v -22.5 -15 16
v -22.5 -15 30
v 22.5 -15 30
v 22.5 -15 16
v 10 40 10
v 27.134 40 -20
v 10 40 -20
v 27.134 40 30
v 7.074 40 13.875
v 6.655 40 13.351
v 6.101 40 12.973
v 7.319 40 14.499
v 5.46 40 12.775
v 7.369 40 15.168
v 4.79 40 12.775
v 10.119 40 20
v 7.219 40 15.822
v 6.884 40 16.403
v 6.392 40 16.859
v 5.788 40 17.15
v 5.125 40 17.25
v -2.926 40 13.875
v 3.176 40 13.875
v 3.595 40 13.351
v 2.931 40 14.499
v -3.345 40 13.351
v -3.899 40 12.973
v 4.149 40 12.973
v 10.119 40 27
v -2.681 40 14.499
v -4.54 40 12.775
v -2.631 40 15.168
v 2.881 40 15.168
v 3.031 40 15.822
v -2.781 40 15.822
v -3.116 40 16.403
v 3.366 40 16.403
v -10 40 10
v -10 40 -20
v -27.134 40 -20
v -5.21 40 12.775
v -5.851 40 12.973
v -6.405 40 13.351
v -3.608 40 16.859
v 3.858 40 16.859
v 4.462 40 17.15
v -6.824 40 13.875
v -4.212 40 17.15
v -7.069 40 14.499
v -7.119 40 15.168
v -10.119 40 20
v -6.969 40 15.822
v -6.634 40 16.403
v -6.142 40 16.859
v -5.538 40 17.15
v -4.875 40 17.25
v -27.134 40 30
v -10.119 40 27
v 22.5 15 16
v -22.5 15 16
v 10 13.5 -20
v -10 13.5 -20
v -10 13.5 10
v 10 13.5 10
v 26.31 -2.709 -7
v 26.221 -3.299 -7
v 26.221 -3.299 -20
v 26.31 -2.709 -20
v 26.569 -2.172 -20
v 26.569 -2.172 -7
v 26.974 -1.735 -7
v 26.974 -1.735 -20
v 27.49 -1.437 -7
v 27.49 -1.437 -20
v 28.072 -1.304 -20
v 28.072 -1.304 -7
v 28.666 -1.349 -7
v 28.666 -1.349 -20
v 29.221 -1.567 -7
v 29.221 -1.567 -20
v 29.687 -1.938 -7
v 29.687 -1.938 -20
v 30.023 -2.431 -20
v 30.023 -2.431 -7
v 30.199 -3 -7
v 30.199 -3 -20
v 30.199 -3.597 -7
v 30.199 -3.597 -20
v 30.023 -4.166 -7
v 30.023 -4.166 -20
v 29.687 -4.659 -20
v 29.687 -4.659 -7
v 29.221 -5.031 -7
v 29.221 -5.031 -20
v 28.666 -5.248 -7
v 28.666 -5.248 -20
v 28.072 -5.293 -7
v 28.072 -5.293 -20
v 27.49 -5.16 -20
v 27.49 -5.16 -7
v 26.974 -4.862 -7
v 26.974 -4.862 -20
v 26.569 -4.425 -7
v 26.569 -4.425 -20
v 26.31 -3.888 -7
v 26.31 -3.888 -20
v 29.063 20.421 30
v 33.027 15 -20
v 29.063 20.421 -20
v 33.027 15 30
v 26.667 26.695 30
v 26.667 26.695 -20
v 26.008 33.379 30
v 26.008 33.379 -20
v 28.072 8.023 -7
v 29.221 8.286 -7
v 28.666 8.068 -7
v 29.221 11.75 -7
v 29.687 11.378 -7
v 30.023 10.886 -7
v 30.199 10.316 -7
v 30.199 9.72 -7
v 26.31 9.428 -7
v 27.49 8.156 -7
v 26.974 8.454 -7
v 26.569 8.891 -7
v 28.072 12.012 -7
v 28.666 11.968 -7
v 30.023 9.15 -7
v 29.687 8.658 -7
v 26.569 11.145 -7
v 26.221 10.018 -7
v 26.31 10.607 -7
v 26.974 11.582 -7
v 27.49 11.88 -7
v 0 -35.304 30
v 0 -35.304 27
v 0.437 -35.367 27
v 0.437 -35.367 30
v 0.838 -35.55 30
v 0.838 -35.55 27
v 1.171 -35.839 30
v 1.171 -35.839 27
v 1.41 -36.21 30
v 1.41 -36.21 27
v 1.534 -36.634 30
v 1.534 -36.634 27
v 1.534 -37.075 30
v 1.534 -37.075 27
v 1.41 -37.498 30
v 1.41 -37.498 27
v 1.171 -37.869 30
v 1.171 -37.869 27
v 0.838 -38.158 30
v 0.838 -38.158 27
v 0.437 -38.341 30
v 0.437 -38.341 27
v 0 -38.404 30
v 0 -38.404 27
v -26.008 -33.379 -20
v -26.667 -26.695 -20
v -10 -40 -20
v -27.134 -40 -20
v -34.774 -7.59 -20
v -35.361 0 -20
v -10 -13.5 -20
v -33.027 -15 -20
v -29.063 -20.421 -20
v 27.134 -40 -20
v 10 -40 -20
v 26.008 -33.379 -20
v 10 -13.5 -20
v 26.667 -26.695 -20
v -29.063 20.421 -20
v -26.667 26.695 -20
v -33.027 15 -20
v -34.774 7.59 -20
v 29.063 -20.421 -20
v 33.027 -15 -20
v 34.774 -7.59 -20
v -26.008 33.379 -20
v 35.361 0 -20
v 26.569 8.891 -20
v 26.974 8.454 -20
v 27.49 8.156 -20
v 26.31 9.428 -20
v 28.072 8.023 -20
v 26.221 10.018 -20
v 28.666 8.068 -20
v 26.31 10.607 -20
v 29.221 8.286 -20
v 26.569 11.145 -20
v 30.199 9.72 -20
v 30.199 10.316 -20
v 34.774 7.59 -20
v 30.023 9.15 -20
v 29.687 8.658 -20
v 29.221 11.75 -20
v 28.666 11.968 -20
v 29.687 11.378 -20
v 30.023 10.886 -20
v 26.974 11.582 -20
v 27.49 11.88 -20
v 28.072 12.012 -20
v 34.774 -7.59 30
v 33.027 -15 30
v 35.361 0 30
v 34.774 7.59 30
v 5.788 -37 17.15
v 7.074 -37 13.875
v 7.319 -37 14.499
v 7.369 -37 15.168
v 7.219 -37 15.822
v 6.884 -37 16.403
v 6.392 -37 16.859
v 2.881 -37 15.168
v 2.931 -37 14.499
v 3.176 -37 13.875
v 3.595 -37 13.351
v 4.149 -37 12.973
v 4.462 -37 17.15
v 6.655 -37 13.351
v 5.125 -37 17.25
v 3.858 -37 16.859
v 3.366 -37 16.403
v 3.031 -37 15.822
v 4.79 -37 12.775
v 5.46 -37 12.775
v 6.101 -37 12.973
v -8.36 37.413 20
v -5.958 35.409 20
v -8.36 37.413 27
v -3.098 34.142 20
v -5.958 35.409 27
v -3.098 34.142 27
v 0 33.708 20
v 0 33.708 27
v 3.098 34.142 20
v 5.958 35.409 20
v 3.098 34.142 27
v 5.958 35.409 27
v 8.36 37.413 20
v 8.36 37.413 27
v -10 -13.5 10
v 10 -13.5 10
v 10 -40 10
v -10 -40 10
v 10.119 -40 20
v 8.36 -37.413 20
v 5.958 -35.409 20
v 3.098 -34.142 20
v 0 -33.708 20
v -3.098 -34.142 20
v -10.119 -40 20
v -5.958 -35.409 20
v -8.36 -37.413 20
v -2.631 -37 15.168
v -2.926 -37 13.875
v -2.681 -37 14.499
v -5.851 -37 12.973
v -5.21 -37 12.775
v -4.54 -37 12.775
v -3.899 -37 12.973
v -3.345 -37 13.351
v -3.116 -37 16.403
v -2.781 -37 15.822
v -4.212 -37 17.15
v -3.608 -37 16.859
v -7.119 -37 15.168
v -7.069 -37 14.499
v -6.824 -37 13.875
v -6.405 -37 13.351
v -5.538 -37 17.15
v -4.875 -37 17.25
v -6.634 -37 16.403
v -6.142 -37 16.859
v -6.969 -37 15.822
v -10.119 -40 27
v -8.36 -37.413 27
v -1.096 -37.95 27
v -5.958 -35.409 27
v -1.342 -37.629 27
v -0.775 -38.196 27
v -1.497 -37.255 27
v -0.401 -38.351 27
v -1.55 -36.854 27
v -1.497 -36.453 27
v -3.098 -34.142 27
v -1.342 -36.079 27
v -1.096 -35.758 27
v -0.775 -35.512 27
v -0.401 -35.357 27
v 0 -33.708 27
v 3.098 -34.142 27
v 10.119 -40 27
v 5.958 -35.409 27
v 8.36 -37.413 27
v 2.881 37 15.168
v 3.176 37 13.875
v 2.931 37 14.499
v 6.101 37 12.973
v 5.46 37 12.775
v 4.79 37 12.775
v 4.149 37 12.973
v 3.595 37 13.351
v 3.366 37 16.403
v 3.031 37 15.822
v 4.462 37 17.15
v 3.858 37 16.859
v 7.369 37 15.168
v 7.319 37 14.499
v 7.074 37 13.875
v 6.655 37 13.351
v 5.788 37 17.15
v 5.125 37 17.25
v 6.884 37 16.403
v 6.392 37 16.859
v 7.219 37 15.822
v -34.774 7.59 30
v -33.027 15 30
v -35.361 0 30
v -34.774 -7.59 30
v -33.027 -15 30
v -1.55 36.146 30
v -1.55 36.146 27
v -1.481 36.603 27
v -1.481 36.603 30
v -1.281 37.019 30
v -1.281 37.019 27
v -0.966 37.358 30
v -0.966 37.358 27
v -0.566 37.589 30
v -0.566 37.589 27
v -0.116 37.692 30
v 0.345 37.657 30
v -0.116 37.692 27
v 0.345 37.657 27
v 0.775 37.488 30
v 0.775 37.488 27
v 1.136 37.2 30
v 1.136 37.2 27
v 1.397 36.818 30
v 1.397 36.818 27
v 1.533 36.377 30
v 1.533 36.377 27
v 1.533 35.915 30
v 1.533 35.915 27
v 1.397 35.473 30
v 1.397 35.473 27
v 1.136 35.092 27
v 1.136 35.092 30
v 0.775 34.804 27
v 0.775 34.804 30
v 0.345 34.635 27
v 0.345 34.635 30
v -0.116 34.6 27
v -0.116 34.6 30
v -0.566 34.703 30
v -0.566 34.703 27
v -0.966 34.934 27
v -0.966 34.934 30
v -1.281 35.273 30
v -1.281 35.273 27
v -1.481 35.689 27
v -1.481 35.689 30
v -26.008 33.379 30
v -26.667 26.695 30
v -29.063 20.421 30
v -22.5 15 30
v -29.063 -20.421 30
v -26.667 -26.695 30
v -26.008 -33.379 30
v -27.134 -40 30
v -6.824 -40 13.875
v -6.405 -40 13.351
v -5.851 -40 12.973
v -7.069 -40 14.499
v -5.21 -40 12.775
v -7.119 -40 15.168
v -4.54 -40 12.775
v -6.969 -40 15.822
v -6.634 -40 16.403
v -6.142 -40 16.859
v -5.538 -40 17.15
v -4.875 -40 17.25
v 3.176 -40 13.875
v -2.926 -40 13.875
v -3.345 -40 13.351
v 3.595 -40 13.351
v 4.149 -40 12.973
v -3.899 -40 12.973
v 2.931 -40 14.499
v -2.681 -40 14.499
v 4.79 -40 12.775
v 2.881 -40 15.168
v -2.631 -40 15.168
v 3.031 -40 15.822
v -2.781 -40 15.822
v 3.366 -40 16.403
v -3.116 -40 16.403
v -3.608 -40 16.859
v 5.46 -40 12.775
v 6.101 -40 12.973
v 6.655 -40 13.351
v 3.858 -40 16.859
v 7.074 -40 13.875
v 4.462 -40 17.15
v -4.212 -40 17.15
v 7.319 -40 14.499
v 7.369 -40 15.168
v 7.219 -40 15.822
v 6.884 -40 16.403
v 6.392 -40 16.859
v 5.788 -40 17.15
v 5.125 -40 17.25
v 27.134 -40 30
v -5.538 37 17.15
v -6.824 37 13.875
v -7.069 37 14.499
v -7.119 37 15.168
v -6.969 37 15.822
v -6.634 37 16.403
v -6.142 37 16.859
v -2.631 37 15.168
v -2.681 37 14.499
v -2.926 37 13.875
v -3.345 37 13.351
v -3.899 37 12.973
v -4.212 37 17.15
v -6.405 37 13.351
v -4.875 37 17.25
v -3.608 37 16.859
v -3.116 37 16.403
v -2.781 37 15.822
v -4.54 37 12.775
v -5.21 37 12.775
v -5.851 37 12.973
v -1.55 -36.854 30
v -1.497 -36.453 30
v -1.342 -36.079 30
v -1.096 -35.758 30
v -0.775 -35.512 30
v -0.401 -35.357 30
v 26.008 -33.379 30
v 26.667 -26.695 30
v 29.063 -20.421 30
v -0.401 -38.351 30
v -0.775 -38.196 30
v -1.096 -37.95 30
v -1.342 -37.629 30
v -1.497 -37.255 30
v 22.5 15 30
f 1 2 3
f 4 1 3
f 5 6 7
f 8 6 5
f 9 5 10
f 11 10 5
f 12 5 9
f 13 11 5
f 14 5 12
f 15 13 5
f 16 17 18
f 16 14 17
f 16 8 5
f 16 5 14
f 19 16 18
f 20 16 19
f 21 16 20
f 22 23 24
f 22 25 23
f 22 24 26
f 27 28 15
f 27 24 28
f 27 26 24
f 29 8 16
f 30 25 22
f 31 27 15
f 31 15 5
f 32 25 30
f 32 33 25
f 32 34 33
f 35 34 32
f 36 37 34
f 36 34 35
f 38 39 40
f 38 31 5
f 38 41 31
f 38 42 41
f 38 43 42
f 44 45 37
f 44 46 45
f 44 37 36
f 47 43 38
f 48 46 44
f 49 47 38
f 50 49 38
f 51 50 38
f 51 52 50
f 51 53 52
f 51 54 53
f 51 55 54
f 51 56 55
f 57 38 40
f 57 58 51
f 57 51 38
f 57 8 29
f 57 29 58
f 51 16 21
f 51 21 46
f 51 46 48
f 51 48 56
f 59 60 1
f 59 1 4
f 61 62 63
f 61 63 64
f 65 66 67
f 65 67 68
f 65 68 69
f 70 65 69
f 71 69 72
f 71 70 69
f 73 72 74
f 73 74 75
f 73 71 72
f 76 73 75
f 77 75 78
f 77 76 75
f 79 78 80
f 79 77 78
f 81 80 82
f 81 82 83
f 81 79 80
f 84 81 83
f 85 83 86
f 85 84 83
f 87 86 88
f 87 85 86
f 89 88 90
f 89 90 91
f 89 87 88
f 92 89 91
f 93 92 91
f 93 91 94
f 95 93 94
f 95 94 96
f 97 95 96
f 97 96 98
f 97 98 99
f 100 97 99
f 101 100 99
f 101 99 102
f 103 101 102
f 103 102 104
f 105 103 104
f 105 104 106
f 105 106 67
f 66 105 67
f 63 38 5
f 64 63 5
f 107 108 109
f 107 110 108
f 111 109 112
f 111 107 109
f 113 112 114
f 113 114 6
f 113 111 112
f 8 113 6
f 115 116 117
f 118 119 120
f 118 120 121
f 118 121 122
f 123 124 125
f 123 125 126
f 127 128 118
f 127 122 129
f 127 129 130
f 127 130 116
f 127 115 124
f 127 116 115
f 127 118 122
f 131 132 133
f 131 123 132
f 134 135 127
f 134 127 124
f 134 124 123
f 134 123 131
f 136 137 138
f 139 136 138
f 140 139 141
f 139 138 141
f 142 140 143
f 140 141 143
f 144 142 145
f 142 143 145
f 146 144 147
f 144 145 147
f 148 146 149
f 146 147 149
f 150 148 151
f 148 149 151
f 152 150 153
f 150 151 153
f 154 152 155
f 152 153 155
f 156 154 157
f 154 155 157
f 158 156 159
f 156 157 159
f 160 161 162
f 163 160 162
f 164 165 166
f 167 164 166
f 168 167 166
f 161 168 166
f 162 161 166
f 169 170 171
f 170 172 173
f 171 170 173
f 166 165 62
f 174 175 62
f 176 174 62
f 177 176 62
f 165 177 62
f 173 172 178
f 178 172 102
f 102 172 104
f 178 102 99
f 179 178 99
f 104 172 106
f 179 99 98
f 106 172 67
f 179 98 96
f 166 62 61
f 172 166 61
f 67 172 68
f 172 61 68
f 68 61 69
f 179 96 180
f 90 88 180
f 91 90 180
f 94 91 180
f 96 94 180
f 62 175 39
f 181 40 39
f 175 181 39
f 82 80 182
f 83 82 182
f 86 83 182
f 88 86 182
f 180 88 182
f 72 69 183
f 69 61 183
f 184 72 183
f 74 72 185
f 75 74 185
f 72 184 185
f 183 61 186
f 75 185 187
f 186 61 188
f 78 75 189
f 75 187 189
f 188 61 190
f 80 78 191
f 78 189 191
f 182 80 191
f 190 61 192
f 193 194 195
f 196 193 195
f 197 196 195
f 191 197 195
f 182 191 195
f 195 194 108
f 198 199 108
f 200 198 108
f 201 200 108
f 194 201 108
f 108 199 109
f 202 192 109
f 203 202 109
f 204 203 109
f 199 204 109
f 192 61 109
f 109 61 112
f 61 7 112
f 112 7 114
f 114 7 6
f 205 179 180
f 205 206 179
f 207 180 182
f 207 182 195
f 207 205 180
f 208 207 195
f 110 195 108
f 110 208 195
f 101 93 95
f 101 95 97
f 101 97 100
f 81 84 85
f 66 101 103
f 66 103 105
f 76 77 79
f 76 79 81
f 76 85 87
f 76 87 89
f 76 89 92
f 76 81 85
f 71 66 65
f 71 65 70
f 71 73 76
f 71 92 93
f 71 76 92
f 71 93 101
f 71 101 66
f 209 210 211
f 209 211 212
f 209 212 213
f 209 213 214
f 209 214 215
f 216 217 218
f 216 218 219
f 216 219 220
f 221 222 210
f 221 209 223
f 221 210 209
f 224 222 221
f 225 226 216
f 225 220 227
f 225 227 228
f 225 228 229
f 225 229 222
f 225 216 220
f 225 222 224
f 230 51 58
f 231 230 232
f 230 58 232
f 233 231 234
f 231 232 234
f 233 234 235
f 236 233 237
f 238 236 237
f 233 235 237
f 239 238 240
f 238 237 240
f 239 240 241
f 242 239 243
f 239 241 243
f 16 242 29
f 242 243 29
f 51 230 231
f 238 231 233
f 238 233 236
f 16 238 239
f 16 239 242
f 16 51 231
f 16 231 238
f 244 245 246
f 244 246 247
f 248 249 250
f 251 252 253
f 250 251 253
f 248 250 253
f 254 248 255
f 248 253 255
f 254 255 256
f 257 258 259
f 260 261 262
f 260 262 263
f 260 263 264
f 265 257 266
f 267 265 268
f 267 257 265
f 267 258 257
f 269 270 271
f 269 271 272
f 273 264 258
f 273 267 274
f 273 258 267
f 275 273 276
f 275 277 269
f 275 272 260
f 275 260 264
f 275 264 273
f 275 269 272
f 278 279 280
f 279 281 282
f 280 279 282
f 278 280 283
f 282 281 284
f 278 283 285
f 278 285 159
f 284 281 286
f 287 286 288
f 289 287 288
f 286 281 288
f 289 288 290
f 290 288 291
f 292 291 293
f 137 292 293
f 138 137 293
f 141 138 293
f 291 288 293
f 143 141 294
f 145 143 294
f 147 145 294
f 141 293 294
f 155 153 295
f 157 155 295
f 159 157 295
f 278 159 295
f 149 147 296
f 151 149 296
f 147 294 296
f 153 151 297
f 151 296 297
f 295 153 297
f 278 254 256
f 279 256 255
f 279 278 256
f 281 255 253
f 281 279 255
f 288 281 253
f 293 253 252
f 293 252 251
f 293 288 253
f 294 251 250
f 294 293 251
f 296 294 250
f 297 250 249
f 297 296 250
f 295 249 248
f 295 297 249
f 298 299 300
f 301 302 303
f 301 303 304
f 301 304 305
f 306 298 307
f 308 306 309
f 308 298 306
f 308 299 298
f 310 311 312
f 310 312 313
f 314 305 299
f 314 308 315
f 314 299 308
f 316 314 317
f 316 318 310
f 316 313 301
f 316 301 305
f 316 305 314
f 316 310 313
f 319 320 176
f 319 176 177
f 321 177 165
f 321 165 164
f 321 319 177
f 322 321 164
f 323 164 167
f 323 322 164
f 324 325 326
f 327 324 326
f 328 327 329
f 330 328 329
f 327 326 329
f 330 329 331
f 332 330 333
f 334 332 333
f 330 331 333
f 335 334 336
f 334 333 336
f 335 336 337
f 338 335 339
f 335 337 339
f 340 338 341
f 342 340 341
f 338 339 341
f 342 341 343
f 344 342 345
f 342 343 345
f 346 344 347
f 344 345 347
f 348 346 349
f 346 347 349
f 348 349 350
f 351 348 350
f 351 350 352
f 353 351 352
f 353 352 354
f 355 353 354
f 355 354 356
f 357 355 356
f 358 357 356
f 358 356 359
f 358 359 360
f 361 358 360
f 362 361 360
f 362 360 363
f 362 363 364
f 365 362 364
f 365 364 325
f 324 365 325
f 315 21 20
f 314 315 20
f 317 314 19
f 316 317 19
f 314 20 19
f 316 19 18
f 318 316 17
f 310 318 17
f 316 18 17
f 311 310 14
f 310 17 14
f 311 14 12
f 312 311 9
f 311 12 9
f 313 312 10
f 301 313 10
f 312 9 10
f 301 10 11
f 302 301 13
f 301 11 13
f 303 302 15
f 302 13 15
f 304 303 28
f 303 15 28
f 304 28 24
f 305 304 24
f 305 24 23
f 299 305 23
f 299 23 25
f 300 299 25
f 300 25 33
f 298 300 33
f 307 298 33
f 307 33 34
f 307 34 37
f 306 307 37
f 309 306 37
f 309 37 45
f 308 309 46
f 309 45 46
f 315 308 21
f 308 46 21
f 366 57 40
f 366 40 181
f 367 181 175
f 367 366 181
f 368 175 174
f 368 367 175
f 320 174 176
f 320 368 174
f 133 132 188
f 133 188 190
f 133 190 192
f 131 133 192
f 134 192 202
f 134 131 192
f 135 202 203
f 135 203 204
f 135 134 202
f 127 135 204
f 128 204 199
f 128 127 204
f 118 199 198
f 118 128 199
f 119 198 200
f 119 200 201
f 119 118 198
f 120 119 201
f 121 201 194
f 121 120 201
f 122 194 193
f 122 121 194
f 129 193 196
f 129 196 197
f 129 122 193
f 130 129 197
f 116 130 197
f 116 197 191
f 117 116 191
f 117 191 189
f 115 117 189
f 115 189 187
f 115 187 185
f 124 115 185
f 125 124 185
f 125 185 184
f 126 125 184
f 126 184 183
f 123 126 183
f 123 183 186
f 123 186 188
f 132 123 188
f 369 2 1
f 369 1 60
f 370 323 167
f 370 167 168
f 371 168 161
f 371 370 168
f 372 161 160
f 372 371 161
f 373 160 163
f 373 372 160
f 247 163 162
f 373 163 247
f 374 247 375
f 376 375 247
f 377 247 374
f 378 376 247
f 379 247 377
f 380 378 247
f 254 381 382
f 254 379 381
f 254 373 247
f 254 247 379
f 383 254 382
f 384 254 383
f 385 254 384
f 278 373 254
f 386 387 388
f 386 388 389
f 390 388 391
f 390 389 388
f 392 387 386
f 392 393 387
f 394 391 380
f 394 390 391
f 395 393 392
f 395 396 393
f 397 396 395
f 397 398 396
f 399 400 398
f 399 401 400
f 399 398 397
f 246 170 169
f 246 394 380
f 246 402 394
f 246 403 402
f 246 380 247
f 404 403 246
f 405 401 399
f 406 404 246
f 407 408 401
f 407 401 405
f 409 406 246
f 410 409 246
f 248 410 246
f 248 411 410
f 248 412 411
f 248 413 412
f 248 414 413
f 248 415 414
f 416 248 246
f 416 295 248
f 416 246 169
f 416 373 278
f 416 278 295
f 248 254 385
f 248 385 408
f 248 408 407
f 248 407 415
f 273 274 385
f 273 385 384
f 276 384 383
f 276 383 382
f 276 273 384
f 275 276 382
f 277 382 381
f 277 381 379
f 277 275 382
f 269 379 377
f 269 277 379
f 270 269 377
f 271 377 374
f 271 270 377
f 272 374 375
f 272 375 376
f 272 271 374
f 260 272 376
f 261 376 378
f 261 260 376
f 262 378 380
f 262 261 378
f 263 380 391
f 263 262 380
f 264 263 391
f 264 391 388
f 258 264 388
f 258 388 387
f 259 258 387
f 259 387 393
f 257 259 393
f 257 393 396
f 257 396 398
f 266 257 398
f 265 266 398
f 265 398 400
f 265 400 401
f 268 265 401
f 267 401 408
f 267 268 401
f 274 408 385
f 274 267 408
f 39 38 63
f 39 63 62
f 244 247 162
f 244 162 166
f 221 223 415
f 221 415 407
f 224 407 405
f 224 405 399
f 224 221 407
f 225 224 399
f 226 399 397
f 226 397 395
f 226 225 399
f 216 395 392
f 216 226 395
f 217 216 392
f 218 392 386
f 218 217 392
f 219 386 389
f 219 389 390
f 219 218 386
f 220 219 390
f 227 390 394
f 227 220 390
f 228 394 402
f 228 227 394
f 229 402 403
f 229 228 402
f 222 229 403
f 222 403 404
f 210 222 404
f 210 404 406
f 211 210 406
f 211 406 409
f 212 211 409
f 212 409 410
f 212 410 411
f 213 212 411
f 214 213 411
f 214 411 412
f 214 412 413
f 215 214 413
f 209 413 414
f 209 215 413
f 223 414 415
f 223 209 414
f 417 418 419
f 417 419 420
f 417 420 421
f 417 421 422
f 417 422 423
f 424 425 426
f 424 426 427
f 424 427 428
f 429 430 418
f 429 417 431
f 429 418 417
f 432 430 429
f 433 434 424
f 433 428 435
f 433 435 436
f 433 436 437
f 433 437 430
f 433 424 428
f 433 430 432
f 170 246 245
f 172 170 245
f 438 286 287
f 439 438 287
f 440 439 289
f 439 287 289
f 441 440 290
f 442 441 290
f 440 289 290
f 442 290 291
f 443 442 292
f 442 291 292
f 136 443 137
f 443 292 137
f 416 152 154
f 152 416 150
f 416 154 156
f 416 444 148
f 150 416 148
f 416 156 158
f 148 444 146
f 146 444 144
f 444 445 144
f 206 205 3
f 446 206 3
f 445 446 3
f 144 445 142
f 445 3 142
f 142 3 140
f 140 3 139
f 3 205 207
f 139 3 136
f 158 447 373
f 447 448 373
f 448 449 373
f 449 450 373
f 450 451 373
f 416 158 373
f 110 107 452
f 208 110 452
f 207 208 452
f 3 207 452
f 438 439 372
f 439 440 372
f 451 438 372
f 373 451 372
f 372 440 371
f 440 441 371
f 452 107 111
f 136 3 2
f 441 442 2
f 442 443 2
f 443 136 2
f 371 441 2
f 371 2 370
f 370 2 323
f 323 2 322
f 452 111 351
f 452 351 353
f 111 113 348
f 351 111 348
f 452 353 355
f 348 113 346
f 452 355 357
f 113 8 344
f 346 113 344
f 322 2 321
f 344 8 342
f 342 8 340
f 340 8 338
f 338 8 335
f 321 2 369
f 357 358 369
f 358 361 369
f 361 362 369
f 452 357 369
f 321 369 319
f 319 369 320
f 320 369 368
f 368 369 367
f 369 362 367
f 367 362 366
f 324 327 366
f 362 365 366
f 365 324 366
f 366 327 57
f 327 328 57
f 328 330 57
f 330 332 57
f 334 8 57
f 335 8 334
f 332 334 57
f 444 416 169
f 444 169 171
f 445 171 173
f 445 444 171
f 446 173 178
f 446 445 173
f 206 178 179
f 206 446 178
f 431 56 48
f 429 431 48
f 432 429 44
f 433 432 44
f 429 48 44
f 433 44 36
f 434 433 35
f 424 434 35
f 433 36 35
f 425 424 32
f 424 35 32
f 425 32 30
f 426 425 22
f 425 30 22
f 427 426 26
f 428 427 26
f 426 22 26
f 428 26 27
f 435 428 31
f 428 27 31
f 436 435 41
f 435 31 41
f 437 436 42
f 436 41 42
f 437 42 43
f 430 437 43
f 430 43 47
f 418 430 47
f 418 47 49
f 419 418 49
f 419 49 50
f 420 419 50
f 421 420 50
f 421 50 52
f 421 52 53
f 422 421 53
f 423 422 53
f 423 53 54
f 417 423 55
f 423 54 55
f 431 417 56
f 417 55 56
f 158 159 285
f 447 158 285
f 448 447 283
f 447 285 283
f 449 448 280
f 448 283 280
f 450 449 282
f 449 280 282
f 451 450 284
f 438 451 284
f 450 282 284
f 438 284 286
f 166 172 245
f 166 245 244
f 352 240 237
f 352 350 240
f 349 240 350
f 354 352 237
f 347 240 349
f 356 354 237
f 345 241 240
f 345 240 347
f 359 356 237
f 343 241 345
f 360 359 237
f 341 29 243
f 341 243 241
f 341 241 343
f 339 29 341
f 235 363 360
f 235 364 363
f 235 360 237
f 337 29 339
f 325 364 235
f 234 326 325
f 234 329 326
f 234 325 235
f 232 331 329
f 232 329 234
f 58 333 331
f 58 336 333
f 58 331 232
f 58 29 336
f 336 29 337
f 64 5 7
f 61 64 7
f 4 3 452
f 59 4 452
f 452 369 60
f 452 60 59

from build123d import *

# Parameters (mm, degrees)
SKETCH_1_W                = 65
SKETCH_1_H                = 25
SKETCH_1_W_2              = 17.5
SKETCH_1_H_2              = 30
EXTRUDE_1_DEPTH           = 30
SKETCH_2_W                = 37.5
SKETCH_2_H                = 30
EXTRUDE_2_DEPTH           = 10
CUT_EXTRUDE_2_DEPTH       = 10
SKETCH_4_W                = 45
SKETCH_4_H                = 30
CUT_EXTRUDE_3_DEPTH       = 6
CUT_EXTRUDE_13_DEPTH      = 16
EXTRUDE_3_DEPTH           = 3
CUT_EXTRUDE_14_DEPTH      = 3
SKETCH_8_R                = 1.55
CUT_EXTRUDE_16_DEPTH      = 6.100799321
CUT_EXTRUDE_17_DEPTH      = 70
EXTRUDE_4_DEPTH           = 20
SKETCH_19_W               = 20
SKETCH_19_H               = 60
CUT_EXTRUDE_25_DEPTH      = 26.5
SKETCH_21_R               = 2.25
CUT_EXTRUDE_27_DEPTH      = 3
SKETCH_22_R               = 2.25
CUT_EXTRUDE_28_DEPTH      = 3
SKETCH_23_W               = 20
SKETCH_23_H               = 26.5
CUT_EXTRUDE_29_DEPTH      = 30
CUT_EXTRUDE_START         = -3
SKETCH_24_R               = 2.25
CUT_EXTRUDE_30_DEPTH      = 3
SKETCH_25_R               = 2
EXTRUDE_5_DEPTH           = 6
SKETCH_26_W               = 45
SKETCH_26_H               = 30
CUT_EXTRUDE_31_DEPTH      = 8
CUT_EXTRUDE_33_DEPTH      = 13
CUT_EXTRUDE_33_DEPTH_BACK = 13
SKETCH_27_R               = 2


with BuildPart() as part:
    # 草图1 → 凸台-拉伸1 (new body)
    with BuildSketch(Plane.XY):
        with Locations((0, 27.5)):
            Rectangle(SKETCH_1_W, SKETCH_1_H)
        with BuildLine():
            ThreePointArc((-41.25, 40), (-40.44733047, 25.687815665), (-50, 15))
            Line((-50, 15), (-32.5, 15))
            Line((-32.5, 15), (-32.5, 40))
            Line((-32.5, 40), (-41.25, 40))
        make_face()
        with BuildLine():
            Line((32.5, 40), (32.5, 15))
            Line((32.5, 15), (50, 15))
            ThreePointArc((50, 15), (40.44733047, 25.687815665), (41.25, 40))
            Line((41.25, 40), (32.5, 40))
        make_face()
        with Locations((41.25, 0)):
            Rectangle(SKETCH_1_W_2, SKETCH_1_H_2)
        Rectangle(SKETCH_1_W, SKETCH_1_H_2)
        with Locations((-41.25, 0)):
            Rectangle(SKETCH_1_W_2, SKETCH_1_H_2)
        with BuildLine():
            ThreePointArc((-50, -15), (-40.44733047, -25.687815665), (-41.25, -40))
            Line((-41.25, -40), (-32.5, -40))
            Line((-32.5, -40), (-32.5, -15))
            Line((-32.5, -15), (-50, -15))
        make_face()
        with Locations((0, -27.5)):
            Rectangle(SKETCH_1_W, SKETCH_1_H)
        with BuildLine():
            Line((32.5, -15), (32.5, -40))
            Line((32.5, -40), (41.25, -40))
            ThreePointArc((41.25, -40), (40.44733047, -25.687815665), (50, -15))
            Line((50, -15), (32.5, -15))
        make_face()
    extrude(amount=EXTRUDE_1_DEPTH)

    # 草图2 → 凸台-拉伸2 (add)
    with BuildSketch(Plane.XY.offset(30)):
        with Locations((68.75, 0)):
            Rectangle(SKETCH_2_W, SKETCH_2_H)
        with BuildLine():
            ThreePointArc((31.362634986, 83.717731106), (24.230066028, 60.16346689), (10.119378388, 40))
            Line((10.119378388, 40), (41.25, 40))
            Line((41.25, 40), (56.546841385, 71.480257998))
            Line((56.546841385, 71.480257998), (31.362634986, 83.717731106))
        make_face()
        with BuildLine():
            Line((-56.546841385, 71.480257998), (-41.25, 40))
            Line((-41.25, 40), (-10.119378388, 40))
            ThreePointArc((-10.119378388, 40), (-24.230066028, 60.16346689), (-31.362634986, 83.717731106))
            Line((-31.362634986, 83.717731106), (-56.546841385, 71.480257998))
        make_face()
        with Locations((-68.75, 0)):
            Rectangle(SKETCH_2_W, SKETCH_2_H)
        with BuildLine():
            ThreePointArc((-31.362634986, -83.717731106), (-24.230066028, -60.16346689), (-10.119378388, -40))
            Line((-10.119378388, -40), (-41.25, -40))
            Line((-41.25, -40), (-56.546841385, -71.480257998))
            Line((-56.546841385, -71.480257998), (-31.362634986, -83.717731106))
        make_face()
        with BuildLine():
            Line((41.25, -40), (10.119378388, -40))
            ThreePointArc((10.119378388, -40), (24.230066028, -60.16346689), (31.362634986, -83.717731106))
            Line((31.362634986, -83.717731106), (56.546841385, -71.480257998))
            Line((56.546841385, -71.480257998), (41.25, -40))
        make_face()
    extrude(amount=-EXTRUDE_2_DEPTH)

    # 草图3 → 切除-拉伸2 (cut)
    with BuildSketch(Plane.XY.offset(30)):
        with BuildLine():
            ThreePointArc((-30.119378388, 40), (-30.215276688, 27.042312386), (-35, 15))
            Line((-35, 15), (-50, 15))
            ThreePointArc((-50, 15), (-40.44733047, 25.687815665), (-41.25, 40))
            Line((-41.25, 40), (-56.546841385, 71.480257998))
            Line((-56.546841385, 71.480257998), (-31.362634986, 83.717731106))
            ThreePointArc((-31.362634986, 83.717731106), (-24.230066028, 60.16346689), (-10.119378388, 40))
            Line((-10.119378388, 40), (-30.119378388, 40))
        make_face()
        with BuildLine():
            Line((10.119378388, 40), (30.119378388, 40))
            ThreePointArc((30.119378388, 40), (30.215276688, 27.042312386), (35, 15))
            Line((35, 15), (50, 15))
            ThreePointArc((50, 15), (40.44733047, 25.687815665), (41.25, 40))
            Line((41.25, 40), (56.546841385, 71.480257998))
            Line((56.546841385, 71.480257998), (31.362634986, 83.717731106))
            ThreePointArc((31.362634986, 83.717731106), (24.230066028, 60.16346689), (10.119378388, 40))
        make_face()
        with BuildLine():
            Line((50, 15), (35, 15))
            ThreePointArc((35, 15), (38.436125858, 0), (35, -15))
            ThreePointArc((35, -15), (30.215276688, -27.042312386), (30.119378388, -40))
            Line((30.119378388, -40), (10.119378388, -40))
            ThreePointArc((10.119378388, -40), (24.230066028, -60.16346689), (31.362634986, -83.717731106))
            Line((31.362634986, -83.717731106), (56.546841385, -71.480257998))
            Line((56.546841385, -71.480257998), (41.25, -40))
            ThreePointArc((41.25, -40), (40.44733047, -25.687815665), (50, -15))
            Line((50, -15), (87.5, -15))
            Line((87.5, -15), (87.5, 15))
            Line((87.5, 15), (50, 15))
        make_face()
        with BuildLine():
            ThreePointArc((-35, 15), (-38.436125858, 0), (-35, -15))
            ThreePointArc((-35, -15), (-30.215276688, -27.042312386), (-30.119378388, -40))
            Line((-30.119378388, -40), (-10.119378388, -40))
            ThreePointArc((-10.119378388, -40), (-24.230066028, -60.16346689), (-31.362634986, -83.717731106))
            Line((-31.362634986, -83.717731106), (-56.546841385, -71.480257998))
            Line((-56.546841385, -71.480257998), (-41.25, -40))
            ThreePointArc((-41.25, -40), (-40.44733047, -25.687815665), (-50, -15))
            Line((-50, -15), (-87.5, -15))
            Line((-87.5, -15), (-87.5, 15))
            Line((-87.5, 15), (-50, 15))
            Line((-50, 15), (-35, 15))
        make_face()
        with BuildLine():
            ThreePointArc((-10.119378388, 40), (0, 33.708220629), (10.119378388, 40))
            Line((10.119378388, 40), (-10.119378388, 40))
        make_face()
        with BuildLine():
            ThreePointArc((-10.119378388, -40), (0, -33.708220629), (10.119378388, -40))
            Line((10.119378388, -40), (-10.119378388, -40))
        make_face()
    extrude(amount=-CUT_EXTRUDE_2_DEPTH, mode=Mode.SUBTRACT)

    # 草图4 → 切除-拉伸3 (cut)
    with BuildSketch(Plane.XY.offset(30)):
        Rectangle(SKETCH_4_W, SKETCH_4_H)
    extrude(amount=-CUT_EXTRUDE_3_DEPTH, mode=Mode.SUBTRACT)

    # 草图5 → 切除-拉伸13 (cut)
    with BuildSketch(Plane.XY.offset(30)):
        with BuildLine():
            ThreePointArc((-30.119378388, 40), (-30.215276688, 27.042312386), (-35, 15))
            ThreePointArc((-35, 15), (-38.436125858, 0), (-35, -15))
            ThreePointArc((-35, -15), (-30.215276688, -27.042312386), (-30.119378388, -40))
            Line((-30.119378388, -40), (-27.133662439, -40))
            ThreePointArc((-27.133662439, -40), (-26.666769997, -26.695264692), (-33.027175168, -15))
            ThreePointArc((-33.027175168, -15), (-35.361355844, 0), (-33.027175168, 15))
            ThreePointArc((-33.027175168, 15), (-26.666769997, 26.695264692), (-27.133662439, 40))
            Line((-27.133662439, 40), (-30.119378388, 40))
        make_face()
        with BuildLine():
            Line((30.119378388, 40), (27.133662439, 40))
            ThreePointArc((27.133662439, 40), (26.666769997, 26.695264692), (33.027175168, 15))
            ThreePointArc((33.027175168, 15), (35.361355844, 0), (33.027175168, -15))
            ThreePointArc((33.027175168, -15), (26.666769997, -26.695264692), (27.133662439, -40))
            Line((27.133662439, -40), (30.119378388, -40))
            ThreePointArc((30.119378388, -40), (30.215276688, -27.042312386), (35, -15))
            ThreePointArc((35, -15), (38.436125858, 0), (35, 15))
            ThreePointArc((35, 15), (30.215276688, 27.042312386), (30.119378388, 40))
        make_face()
    extrude(amount=-CUT_EXTRUDE_13_DEPTH, mode=Mode.SUBTRACT)

    # 草图6 → 凸台-拉伸3 (add)
    with BuildSketch(Plane.XY.offset(30)):
        with BuildLine():
            Line((-10.119378388, 40), (10.119378388, 40))
            ThreePointArc((10.119378388, 40), (0, 33.708220629), (-10.119378388, 40))
        make_face()
        with BuildLine():
            Line((-10.119378388, -40), (10.119378388, -40))
            ThreePointArc((10.119378388, -40), (0, -33.708220629), (-10.119378388, -40))
        make_face()
    extrude(amount=-EXTRUDE_3_DEPTH)

    # 草图7 → 切除-拉伸14 (cut)
    with BuildSketch(Plane(origin=(0, 0, 27), x_dir=(-1, 0, 0), z_dir=(0, 0, -1))):
        with BuildLine():
            ThreePointArc((0, -35.304110315), (-1.55, -36.854110315), (0, -38.404110315))
            Line((0, -38.404110315), (0, -36.854110315))
            Line((0, -36.854110315), (0, -35.304110315))
        make_face()
        with BuildLine():
            Line((0, -36.854110315), (0, -38.404110315))
            ThreePointArc((0, -38.404110315), (1.096015511, -37.950125825), (1.55, -36.854110315))
            ThreePointArc((1.55, -36.854110315), (1.096015511, -35.758094804), (0, -35.304110315))
            Line((0, -35.304110315), (0, -36.854110315))
        make_face()
    extrude(amount=-CUT_EXTRUDE_14_DEPTH, mode=Mode.SUBTRACT)

    # 草图8 → 切除-拉伸16 (cut)
    with BuildSketch(Plane(origin=(0, 0, 27), x_dir=(-1, 0, 0), z_dir=(0, 0, -1))):
        with Locations((0, 36.145889685)):
            Circle(SKETCH_8_R)
    extrude(amount=-CUT_EXTRUDE_16_DEPTH, mode=Mode.SUBTRACT)

    # 草图10 → 切除-拉伸17 (cut)
    with BuildSketch(Plane.XY.offset(30)):
        Polygon((-155.646447014, 80.863193175), (70.83129327, 55.935441896), (148.654516777, 0), (148.654516777, -24.319757346), (1.823981801, -88.159120379), (-119.470807962, -24.319757346), align=None)
        with BuildLine():
            Line((-27.133662439, 40), (27.133662439, 40))
            ThreePointArc((27.133662439, 40), (26.666769997, 26.695264692), (33.027175168, 15))
            ThreePointArc((33.027175168, 15), (35.361355844, 0), (33.027175168, -15))
            ThreePointArc((33.027175168, -15), (26.666769997, -26.695264692), (27.133662439, -40))
            Line((27.133662439, -40), (-27.133662439, -40))
            ThreePointArc((-27.133662439, -40), (-26.666769997, -26.695264692), (-33.027175168, -15))
            ThreePointArc((-33.027175168, -15), (-35.361355844, 0), (-33.027175168, 15))
            ThreePointArc((-33.027175168, 15), (-26.666769997, 26.695264692), (-27.133662439, 40))
        make_face(mode=Mode.SUBTRACT)
    extrude(amount=-CUT_EXTRUDE_17_DEPTH, mode=Mode.SUBTRACT)

    # 草图11 → 凸台-拉伸4 (add)
    with BuildSketch(Plane(origin=(0, 0, 0), x_dir=(-1, 0, 0), z_dir=(0, 0, -1))):
        with BuildLine():
            Line((-27.133662439, 40), (27.133662439, 40))
            ThreePointArc((27.133662439, 40), (26.666769997, 26.695264692), (33.027175168, 15))
            ThreePointArc((33.027175168, 15), (35.361355844, 0), (33.027175168, -15))
            ThreePointArc((33.027175168, -15), (26.666769997, -26.695264692), (27.133662439, -40))
            Line((27.133662439, -40), (-27.133662439, -40))
            ThreePointArc((-27.133662439, -40), (-26.666769997, -26.695264692), (-33.027175168, -15))
            ThreePointArc((-33.027175168, -15), (-35.361355844, 0), (-33.027175168, 15))
            ThreePointArc((-33.027175168, 15), (-26.666769997, 26.695264692), (-27.133662439, 40))
        make_face()
    extrude(amount=EXTRUDE_4_DEPTH)

    # 草图19 → 切除-拉伸25 (cut)
    with BuildSketch(Plane(origin=(0, 40, 0), x_dir=(1, 0, 0), z_dir=(0, 1, 0))):
        with Locations((0, 20)):
            Rectangle(SKETCH_19_W, SKETCH_19_H)
    extrude(amount=-CUT_EXTRUDE_25_DEPTH, mode=Mode.SUBTRACT)

    # 草图21 → 切除-拉伸27 (cut)
    with BuildSketch(Plane(origin=(0, 40, 0), x_dir=(1, 0, 0), z_dir=(0, 1, 0))):
        with Locations(Location((-4.875, -15, 0), (0, 0, 270))):
            Circle(SKETCH_21_R)
    extrude(amount=-CUT_EXTRUDE_27_DEPTH, mode=Mode.SUBTRACT)

    # 草图22 → 切除-拉伸28 (cut)
    with BuildSketch(Plane(origin=(0, 40, 0), x_dir=(1, 0, 0), z_dir=(0, 1, 0))):
        with Locations(Location((5.125, -15, 0), (0, 0, 270))):
            Circle(SKETCH_22_R)
    extrude(amount=-CUT_EXTRUDE_28_DEPTH, mode=Mode.SUBTRACT)

    # 草图23 → 切除-拉伸29 (cut)
    with BuildSketch(Plane(origin=(0, 0, -20), x_dir=(-1, 0, 0), z_dir=(0, 0, -1))):
        with Locations((0, -26.75)):
            Rectangle(SKETCH_23_W, SKETCH_23_H)
        with Locations((0, 26.75)):
            Rectangle(SKETCH_23_W, SKETCH_23_H)
    extrude(amount=-CUT_EXTRUDE_29_DEPTH, mode=Mode.SUBTRACT)

    # 草图24 → 切除-拉伸30 (cut)
    with BuildSketch(Plane.XZ.offset(40).offset(CUT_EXTRUDE_START)):
        with Locations(Location((-4.875, 15, 0), (0, 0, 90))):
            Circle(SKETCH_24_R)
        with Locations(Location((5.125, 15, 0), (0, 0, 90))):
            Circle(SKETCH_24_R)
    extrude(amount=CUT_EXTRUDE_30_DEPTH, mode=Mode.SUBTRACT)

    # 草图25 → 凸台-拉伸5 (add)
    with BuildSketch(Plane(origin=(0, 0, -20), x_dir=(-1, 0, 0), z_dir=(0, 0, -1))):
        with Locations((-28.221169036, 10.01790416)):
            Circle(SKETCH_25_R)
        with Locations((-28.221169036, -3.298578199)):
            Circle(SKETCH_25_R)
    extrude(amount=EXTRUDE_5_DEPTH)

    # 草图26 → 切除-拉伸31 (cut)
    with BuildSketch(Plane.XY.offset(24)):
        Rectangle(SKETCH_26_W, SKETCH_26_H)
    extrude(amount=-CUT_EXTRUDE_31_DEPTH, mode=Mode.SUBTRACT)

    # 草图27 → 切除-拉伸33 (cut, two sides: drawn at the far end of the back side and taken through both)
    with BuildSketch(Plane(origin=(0, 0, -20), x_dir=(-1, 0, 0), z_dir=(0, 0, -1)).offset(-CUT_EXTRUDE_33_DEPTH_BACK)):
        with Locations((-28.221169036, -3.298578199)):
            Circle(SKETCH_27_R)
        with Locations((-28.221169036, 10.01790416)):
            Circle(SKETCH_27_R)
    extrude(amount=CUT_EXTRUDE_33_DEPTH + CUT_EXTRUDE_33_DEPTH_BACK, mode=Mode.SUBTRACT)


solid = part.part
